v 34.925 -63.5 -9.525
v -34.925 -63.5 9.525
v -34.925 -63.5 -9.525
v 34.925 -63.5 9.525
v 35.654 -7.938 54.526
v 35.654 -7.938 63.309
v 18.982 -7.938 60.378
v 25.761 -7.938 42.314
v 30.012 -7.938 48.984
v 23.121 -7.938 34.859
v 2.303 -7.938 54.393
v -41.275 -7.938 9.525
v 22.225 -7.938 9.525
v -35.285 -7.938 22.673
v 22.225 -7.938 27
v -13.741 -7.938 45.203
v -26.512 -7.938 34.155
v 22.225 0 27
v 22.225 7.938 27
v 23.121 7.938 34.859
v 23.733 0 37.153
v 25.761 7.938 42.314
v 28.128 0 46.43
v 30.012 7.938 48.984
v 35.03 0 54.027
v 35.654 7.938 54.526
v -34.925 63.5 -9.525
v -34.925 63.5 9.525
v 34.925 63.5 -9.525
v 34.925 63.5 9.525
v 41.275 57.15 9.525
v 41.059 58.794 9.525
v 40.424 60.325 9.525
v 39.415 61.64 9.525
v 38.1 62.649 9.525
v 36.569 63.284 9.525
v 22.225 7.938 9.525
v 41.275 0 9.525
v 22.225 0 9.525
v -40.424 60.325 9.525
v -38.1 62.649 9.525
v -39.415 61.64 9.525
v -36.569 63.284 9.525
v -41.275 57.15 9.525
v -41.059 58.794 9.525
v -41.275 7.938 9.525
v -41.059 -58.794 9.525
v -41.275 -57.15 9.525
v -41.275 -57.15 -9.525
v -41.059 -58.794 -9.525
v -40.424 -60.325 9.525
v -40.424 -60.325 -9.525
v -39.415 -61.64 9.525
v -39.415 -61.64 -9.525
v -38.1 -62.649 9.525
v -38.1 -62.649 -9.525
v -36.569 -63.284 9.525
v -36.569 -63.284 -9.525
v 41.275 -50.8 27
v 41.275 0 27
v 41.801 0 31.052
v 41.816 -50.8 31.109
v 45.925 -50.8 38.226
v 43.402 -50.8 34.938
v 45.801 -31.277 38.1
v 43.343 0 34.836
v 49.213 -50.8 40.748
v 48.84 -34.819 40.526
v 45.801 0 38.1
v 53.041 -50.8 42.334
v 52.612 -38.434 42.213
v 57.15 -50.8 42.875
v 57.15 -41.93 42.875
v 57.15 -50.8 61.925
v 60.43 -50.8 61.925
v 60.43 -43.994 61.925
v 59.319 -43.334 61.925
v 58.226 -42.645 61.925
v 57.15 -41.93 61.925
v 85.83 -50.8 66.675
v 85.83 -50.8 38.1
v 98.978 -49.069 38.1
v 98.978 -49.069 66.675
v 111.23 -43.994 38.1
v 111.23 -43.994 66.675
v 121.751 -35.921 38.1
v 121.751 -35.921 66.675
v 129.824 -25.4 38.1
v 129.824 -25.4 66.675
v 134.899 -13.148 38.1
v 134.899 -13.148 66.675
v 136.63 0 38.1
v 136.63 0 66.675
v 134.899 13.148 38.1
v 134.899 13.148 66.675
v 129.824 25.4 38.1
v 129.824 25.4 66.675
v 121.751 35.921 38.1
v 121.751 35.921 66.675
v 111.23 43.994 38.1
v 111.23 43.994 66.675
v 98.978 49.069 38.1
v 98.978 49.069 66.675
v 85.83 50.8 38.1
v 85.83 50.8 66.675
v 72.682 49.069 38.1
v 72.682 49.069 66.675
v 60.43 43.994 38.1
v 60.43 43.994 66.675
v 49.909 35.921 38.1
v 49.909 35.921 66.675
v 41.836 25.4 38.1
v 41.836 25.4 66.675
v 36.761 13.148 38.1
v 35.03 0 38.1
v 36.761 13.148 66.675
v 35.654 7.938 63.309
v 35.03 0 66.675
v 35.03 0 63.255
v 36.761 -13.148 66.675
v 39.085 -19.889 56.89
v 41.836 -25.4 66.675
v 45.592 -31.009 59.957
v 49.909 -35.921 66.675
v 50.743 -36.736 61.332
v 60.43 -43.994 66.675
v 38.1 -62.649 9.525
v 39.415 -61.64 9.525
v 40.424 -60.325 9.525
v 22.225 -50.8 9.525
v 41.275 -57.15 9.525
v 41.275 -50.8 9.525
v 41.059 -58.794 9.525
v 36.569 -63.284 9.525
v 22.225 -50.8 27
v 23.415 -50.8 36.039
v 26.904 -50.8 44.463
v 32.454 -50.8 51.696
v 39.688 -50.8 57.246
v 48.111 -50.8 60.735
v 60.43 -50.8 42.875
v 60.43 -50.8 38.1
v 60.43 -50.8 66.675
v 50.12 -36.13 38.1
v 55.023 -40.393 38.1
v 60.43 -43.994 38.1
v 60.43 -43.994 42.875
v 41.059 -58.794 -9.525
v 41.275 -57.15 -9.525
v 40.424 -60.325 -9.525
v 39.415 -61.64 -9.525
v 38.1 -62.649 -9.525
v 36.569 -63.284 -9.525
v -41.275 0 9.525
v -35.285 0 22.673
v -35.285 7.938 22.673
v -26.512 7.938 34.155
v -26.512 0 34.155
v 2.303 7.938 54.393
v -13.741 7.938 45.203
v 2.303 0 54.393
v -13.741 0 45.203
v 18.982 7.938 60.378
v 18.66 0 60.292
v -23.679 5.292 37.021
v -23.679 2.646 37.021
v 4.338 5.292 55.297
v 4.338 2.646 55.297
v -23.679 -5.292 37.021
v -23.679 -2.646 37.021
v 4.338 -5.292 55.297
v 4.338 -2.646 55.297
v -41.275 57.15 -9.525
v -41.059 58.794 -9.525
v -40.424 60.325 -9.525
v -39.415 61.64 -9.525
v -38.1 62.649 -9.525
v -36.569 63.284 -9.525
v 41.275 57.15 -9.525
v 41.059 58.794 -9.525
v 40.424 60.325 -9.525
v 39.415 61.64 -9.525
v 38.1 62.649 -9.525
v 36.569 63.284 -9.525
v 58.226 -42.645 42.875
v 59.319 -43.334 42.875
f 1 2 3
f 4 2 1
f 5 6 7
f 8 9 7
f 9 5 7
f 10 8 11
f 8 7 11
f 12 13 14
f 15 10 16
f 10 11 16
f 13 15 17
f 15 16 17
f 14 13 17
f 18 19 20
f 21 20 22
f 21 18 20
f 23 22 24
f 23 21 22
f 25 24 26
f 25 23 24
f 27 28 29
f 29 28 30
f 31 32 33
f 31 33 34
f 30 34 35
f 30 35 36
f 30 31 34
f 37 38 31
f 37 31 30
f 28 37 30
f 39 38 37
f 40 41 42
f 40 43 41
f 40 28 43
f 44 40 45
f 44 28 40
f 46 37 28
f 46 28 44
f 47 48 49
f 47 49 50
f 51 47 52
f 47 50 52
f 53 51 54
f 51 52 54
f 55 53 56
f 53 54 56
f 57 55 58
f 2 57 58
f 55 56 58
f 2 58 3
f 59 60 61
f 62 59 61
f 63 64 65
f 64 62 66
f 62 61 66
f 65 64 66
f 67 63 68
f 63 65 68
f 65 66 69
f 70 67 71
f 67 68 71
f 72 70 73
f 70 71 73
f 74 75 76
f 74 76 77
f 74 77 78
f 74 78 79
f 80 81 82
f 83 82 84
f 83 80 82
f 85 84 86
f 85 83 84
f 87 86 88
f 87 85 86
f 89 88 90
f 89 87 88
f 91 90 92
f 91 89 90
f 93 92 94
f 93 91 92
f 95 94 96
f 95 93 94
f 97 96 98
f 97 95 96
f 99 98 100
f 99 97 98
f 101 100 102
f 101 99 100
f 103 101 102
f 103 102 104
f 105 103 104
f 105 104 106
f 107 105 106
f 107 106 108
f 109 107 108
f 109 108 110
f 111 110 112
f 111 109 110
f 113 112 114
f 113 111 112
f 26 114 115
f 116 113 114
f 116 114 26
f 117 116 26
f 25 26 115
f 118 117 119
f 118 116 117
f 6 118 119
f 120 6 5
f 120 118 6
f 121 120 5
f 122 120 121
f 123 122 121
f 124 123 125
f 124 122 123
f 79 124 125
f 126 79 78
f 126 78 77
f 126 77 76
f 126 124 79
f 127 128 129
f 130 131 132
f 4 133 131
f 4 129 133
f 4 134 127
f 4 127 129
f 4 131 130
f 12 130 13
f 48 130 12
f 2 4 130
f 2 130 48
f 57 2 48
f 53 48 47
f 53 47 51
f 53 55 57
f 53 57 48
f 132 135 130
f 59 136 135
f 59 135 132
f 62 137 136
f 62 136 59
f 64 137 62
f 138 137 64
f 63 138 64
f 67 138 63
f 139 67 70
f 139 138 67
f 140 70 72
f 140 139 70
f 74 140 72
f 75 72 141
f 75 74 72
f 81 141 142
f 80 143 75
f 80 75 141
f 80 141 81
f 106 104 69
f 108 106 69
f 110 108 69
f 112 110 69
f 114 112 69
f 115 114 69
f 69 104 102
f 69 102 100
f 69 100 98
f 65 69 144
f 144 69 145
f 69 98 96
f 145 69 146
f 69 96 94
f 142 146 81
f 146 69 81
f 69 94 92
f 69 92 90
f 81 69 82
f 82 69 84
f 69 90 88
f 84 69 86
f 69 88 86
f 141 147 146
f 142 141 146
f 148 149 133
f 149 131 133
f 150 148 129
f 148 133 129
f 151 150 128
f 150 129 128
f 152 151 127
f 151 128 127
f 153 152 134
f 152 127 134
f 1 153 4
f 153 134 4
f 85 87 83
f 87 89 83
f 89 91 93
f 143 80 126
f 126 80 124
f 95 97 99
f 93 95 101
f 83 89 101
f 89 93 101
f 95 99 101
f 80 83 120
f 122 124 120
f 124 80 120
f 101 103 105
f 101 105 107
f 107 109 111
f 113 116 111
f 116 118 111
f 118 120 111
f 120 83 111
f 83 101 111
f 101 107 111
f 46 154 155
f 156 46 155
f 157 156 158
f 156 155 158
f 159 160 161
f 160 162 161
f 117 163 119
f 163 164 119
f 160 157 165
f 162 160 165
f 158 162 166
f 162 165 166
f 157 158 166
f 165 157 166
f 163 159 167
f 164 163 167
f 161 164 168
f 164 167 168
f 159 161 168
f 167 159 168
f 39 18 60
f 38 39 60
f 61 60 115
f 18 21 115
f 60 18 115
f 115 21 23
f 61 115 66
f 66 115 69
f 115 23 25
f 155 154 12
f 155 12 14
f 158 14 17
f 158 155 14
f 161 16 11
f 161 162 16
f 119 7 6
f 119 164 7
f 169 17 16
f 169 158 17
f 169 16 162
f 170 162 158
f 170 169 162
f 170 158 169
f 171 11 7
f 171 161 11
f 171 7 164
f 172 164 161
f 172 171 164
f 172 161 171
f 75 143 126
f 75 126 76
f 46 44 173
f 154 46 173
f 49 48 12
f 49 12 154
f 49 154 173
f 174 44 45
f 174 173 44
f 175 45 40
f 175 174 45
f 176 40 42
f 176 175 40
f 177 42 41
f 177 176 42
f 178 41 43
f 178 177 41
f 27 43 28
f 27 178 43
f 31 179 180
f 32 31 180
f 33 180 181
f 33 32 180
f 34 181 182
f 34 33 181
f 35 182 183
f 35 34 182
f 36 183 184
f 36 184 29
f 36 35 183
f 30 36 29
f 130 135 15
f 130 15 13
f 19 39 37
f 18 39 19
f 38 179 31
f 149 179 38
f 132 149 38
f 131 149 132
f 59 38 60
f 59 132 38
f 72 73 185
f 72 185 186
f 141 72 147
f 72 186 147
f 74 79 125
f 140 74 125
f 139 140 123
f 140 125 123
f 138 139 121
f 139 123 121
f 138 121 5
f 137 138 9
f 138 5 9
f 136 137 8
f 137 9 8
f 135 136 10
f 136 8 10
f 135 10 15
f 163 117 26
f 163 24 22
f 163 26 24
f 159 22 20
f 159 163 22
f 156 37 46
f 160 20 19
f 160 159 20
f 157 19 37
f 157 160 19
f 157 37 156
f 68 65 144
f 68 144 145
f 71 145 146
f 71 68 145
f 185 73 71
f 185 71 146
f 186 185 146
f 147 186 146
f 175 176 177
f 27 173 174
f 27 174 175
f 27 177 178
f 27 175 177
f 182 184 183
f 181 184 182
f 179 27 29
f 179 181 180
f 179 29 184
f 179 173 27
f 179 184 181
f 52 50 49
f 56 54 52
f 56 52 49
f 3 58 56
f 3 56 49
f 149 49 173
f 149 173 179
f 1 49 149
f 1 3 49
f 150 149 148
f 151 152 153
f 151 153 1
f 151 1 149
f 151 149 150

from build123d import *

# Parameters (mm, degrees)
F1_DEPTH  = 63.5
F2_DEPTH  = 50.8
F3_DEPTH  = 7.9375
F2_FACE_W = 50.8
F2_FACE_H = 28.575
F5_R      = 6.35


with BuildPart() as f1:
    # F0 (on Front) → F1 (new body, symmetric)
    with BuildSketch(Plane.XZ):
        Polygon((-41.275, 9.525), (-41.275, -9.525), (41.275, -9.525), (41.275, 9.525), (22.225, 9.525), align=None)
    extrude(amount=F1_DEPTH, both=True)

    # F0 (on Front) → F2 (join)
    with BuildSketch(Plane.XZ):
        with BuildLine():
            Line((22.225, 9.525), (41.275, 9.525))
            Line((41.275, 9.525), (41.275, 27.0002))
            ThreePointArc((41.275, 27.0002), (45.92468, 38.22552), (57.15, 42.8752))
            Line((57.15, 42.8752), (60.430248, 42.8752))
            Line((60.430248, 42.8752), (60.430248, 61.9252))
            Line((60.430248, 61.9252), (57.15, 61.9252))
            ThreePointArc((57.15, 61.9252), (32.454296, 51.695904), (22.225, 27.0002))
            Line((22.225, 27.0002), (22.225, 9.525))
        make_face()
        Polygon((60.430248, 66.675), (60.430248, 61.9252), (60.430248, 42.8752), (60.430248, 38.1), (85.830248, 38.1), (85.830248, 66.675), align=None)
    extrude(amount=F2_DEPTH)

    # F0 (on Front) → F3 (join, symmetric)
    with BuildSketch(Plane.XZ):
        with BuildLine():
            add(Edge.make_bspline(
                [(-41.275, 9.525), (-28.744785, 49.276773), (25.011688, 69.808759), (57.15, 61.9252)],
                knots=[0, 0, 0, 0, 111.504536, 111.504536, 111.504536, 111.504536], degree=3))
            Line((-41.275, 9.525), (22.225, 9.525))
            Line((22.225, 9.525), (22.225, 27.0002))
            ThreePointArc((22.225, 27.0002), (32.454296, 51.695904), (57.15, 61.9252))
        make_face()
    extrude(amount=F3_DEPTH, both=True)

    # F2_face (on face) → F4 (revolve)
    with BuildSketch(Plane(origin=(85.830248, -25.4, 52.3875), x_dir=(0, 1, 0), z_dir=(1, 0, 0))):
        Rectangle(F2_FACE_W, F2_FACE_H)
    revolve(axis=Axis((85.830248, 0, 52.3875), (0, 0, 1)))

    # F5
    f5_edges = [f1.edges().sort_by_distance(p)[0] for p in [
        (41.275, -63.5, 0),
        (-41.275, -63.5, 0),
        (41.275, 63.5, 0),
        (-41.275, 63.5, 0),
    ]]
    fillet(f5_edges, radius=F5_R)


solid = f1.part
